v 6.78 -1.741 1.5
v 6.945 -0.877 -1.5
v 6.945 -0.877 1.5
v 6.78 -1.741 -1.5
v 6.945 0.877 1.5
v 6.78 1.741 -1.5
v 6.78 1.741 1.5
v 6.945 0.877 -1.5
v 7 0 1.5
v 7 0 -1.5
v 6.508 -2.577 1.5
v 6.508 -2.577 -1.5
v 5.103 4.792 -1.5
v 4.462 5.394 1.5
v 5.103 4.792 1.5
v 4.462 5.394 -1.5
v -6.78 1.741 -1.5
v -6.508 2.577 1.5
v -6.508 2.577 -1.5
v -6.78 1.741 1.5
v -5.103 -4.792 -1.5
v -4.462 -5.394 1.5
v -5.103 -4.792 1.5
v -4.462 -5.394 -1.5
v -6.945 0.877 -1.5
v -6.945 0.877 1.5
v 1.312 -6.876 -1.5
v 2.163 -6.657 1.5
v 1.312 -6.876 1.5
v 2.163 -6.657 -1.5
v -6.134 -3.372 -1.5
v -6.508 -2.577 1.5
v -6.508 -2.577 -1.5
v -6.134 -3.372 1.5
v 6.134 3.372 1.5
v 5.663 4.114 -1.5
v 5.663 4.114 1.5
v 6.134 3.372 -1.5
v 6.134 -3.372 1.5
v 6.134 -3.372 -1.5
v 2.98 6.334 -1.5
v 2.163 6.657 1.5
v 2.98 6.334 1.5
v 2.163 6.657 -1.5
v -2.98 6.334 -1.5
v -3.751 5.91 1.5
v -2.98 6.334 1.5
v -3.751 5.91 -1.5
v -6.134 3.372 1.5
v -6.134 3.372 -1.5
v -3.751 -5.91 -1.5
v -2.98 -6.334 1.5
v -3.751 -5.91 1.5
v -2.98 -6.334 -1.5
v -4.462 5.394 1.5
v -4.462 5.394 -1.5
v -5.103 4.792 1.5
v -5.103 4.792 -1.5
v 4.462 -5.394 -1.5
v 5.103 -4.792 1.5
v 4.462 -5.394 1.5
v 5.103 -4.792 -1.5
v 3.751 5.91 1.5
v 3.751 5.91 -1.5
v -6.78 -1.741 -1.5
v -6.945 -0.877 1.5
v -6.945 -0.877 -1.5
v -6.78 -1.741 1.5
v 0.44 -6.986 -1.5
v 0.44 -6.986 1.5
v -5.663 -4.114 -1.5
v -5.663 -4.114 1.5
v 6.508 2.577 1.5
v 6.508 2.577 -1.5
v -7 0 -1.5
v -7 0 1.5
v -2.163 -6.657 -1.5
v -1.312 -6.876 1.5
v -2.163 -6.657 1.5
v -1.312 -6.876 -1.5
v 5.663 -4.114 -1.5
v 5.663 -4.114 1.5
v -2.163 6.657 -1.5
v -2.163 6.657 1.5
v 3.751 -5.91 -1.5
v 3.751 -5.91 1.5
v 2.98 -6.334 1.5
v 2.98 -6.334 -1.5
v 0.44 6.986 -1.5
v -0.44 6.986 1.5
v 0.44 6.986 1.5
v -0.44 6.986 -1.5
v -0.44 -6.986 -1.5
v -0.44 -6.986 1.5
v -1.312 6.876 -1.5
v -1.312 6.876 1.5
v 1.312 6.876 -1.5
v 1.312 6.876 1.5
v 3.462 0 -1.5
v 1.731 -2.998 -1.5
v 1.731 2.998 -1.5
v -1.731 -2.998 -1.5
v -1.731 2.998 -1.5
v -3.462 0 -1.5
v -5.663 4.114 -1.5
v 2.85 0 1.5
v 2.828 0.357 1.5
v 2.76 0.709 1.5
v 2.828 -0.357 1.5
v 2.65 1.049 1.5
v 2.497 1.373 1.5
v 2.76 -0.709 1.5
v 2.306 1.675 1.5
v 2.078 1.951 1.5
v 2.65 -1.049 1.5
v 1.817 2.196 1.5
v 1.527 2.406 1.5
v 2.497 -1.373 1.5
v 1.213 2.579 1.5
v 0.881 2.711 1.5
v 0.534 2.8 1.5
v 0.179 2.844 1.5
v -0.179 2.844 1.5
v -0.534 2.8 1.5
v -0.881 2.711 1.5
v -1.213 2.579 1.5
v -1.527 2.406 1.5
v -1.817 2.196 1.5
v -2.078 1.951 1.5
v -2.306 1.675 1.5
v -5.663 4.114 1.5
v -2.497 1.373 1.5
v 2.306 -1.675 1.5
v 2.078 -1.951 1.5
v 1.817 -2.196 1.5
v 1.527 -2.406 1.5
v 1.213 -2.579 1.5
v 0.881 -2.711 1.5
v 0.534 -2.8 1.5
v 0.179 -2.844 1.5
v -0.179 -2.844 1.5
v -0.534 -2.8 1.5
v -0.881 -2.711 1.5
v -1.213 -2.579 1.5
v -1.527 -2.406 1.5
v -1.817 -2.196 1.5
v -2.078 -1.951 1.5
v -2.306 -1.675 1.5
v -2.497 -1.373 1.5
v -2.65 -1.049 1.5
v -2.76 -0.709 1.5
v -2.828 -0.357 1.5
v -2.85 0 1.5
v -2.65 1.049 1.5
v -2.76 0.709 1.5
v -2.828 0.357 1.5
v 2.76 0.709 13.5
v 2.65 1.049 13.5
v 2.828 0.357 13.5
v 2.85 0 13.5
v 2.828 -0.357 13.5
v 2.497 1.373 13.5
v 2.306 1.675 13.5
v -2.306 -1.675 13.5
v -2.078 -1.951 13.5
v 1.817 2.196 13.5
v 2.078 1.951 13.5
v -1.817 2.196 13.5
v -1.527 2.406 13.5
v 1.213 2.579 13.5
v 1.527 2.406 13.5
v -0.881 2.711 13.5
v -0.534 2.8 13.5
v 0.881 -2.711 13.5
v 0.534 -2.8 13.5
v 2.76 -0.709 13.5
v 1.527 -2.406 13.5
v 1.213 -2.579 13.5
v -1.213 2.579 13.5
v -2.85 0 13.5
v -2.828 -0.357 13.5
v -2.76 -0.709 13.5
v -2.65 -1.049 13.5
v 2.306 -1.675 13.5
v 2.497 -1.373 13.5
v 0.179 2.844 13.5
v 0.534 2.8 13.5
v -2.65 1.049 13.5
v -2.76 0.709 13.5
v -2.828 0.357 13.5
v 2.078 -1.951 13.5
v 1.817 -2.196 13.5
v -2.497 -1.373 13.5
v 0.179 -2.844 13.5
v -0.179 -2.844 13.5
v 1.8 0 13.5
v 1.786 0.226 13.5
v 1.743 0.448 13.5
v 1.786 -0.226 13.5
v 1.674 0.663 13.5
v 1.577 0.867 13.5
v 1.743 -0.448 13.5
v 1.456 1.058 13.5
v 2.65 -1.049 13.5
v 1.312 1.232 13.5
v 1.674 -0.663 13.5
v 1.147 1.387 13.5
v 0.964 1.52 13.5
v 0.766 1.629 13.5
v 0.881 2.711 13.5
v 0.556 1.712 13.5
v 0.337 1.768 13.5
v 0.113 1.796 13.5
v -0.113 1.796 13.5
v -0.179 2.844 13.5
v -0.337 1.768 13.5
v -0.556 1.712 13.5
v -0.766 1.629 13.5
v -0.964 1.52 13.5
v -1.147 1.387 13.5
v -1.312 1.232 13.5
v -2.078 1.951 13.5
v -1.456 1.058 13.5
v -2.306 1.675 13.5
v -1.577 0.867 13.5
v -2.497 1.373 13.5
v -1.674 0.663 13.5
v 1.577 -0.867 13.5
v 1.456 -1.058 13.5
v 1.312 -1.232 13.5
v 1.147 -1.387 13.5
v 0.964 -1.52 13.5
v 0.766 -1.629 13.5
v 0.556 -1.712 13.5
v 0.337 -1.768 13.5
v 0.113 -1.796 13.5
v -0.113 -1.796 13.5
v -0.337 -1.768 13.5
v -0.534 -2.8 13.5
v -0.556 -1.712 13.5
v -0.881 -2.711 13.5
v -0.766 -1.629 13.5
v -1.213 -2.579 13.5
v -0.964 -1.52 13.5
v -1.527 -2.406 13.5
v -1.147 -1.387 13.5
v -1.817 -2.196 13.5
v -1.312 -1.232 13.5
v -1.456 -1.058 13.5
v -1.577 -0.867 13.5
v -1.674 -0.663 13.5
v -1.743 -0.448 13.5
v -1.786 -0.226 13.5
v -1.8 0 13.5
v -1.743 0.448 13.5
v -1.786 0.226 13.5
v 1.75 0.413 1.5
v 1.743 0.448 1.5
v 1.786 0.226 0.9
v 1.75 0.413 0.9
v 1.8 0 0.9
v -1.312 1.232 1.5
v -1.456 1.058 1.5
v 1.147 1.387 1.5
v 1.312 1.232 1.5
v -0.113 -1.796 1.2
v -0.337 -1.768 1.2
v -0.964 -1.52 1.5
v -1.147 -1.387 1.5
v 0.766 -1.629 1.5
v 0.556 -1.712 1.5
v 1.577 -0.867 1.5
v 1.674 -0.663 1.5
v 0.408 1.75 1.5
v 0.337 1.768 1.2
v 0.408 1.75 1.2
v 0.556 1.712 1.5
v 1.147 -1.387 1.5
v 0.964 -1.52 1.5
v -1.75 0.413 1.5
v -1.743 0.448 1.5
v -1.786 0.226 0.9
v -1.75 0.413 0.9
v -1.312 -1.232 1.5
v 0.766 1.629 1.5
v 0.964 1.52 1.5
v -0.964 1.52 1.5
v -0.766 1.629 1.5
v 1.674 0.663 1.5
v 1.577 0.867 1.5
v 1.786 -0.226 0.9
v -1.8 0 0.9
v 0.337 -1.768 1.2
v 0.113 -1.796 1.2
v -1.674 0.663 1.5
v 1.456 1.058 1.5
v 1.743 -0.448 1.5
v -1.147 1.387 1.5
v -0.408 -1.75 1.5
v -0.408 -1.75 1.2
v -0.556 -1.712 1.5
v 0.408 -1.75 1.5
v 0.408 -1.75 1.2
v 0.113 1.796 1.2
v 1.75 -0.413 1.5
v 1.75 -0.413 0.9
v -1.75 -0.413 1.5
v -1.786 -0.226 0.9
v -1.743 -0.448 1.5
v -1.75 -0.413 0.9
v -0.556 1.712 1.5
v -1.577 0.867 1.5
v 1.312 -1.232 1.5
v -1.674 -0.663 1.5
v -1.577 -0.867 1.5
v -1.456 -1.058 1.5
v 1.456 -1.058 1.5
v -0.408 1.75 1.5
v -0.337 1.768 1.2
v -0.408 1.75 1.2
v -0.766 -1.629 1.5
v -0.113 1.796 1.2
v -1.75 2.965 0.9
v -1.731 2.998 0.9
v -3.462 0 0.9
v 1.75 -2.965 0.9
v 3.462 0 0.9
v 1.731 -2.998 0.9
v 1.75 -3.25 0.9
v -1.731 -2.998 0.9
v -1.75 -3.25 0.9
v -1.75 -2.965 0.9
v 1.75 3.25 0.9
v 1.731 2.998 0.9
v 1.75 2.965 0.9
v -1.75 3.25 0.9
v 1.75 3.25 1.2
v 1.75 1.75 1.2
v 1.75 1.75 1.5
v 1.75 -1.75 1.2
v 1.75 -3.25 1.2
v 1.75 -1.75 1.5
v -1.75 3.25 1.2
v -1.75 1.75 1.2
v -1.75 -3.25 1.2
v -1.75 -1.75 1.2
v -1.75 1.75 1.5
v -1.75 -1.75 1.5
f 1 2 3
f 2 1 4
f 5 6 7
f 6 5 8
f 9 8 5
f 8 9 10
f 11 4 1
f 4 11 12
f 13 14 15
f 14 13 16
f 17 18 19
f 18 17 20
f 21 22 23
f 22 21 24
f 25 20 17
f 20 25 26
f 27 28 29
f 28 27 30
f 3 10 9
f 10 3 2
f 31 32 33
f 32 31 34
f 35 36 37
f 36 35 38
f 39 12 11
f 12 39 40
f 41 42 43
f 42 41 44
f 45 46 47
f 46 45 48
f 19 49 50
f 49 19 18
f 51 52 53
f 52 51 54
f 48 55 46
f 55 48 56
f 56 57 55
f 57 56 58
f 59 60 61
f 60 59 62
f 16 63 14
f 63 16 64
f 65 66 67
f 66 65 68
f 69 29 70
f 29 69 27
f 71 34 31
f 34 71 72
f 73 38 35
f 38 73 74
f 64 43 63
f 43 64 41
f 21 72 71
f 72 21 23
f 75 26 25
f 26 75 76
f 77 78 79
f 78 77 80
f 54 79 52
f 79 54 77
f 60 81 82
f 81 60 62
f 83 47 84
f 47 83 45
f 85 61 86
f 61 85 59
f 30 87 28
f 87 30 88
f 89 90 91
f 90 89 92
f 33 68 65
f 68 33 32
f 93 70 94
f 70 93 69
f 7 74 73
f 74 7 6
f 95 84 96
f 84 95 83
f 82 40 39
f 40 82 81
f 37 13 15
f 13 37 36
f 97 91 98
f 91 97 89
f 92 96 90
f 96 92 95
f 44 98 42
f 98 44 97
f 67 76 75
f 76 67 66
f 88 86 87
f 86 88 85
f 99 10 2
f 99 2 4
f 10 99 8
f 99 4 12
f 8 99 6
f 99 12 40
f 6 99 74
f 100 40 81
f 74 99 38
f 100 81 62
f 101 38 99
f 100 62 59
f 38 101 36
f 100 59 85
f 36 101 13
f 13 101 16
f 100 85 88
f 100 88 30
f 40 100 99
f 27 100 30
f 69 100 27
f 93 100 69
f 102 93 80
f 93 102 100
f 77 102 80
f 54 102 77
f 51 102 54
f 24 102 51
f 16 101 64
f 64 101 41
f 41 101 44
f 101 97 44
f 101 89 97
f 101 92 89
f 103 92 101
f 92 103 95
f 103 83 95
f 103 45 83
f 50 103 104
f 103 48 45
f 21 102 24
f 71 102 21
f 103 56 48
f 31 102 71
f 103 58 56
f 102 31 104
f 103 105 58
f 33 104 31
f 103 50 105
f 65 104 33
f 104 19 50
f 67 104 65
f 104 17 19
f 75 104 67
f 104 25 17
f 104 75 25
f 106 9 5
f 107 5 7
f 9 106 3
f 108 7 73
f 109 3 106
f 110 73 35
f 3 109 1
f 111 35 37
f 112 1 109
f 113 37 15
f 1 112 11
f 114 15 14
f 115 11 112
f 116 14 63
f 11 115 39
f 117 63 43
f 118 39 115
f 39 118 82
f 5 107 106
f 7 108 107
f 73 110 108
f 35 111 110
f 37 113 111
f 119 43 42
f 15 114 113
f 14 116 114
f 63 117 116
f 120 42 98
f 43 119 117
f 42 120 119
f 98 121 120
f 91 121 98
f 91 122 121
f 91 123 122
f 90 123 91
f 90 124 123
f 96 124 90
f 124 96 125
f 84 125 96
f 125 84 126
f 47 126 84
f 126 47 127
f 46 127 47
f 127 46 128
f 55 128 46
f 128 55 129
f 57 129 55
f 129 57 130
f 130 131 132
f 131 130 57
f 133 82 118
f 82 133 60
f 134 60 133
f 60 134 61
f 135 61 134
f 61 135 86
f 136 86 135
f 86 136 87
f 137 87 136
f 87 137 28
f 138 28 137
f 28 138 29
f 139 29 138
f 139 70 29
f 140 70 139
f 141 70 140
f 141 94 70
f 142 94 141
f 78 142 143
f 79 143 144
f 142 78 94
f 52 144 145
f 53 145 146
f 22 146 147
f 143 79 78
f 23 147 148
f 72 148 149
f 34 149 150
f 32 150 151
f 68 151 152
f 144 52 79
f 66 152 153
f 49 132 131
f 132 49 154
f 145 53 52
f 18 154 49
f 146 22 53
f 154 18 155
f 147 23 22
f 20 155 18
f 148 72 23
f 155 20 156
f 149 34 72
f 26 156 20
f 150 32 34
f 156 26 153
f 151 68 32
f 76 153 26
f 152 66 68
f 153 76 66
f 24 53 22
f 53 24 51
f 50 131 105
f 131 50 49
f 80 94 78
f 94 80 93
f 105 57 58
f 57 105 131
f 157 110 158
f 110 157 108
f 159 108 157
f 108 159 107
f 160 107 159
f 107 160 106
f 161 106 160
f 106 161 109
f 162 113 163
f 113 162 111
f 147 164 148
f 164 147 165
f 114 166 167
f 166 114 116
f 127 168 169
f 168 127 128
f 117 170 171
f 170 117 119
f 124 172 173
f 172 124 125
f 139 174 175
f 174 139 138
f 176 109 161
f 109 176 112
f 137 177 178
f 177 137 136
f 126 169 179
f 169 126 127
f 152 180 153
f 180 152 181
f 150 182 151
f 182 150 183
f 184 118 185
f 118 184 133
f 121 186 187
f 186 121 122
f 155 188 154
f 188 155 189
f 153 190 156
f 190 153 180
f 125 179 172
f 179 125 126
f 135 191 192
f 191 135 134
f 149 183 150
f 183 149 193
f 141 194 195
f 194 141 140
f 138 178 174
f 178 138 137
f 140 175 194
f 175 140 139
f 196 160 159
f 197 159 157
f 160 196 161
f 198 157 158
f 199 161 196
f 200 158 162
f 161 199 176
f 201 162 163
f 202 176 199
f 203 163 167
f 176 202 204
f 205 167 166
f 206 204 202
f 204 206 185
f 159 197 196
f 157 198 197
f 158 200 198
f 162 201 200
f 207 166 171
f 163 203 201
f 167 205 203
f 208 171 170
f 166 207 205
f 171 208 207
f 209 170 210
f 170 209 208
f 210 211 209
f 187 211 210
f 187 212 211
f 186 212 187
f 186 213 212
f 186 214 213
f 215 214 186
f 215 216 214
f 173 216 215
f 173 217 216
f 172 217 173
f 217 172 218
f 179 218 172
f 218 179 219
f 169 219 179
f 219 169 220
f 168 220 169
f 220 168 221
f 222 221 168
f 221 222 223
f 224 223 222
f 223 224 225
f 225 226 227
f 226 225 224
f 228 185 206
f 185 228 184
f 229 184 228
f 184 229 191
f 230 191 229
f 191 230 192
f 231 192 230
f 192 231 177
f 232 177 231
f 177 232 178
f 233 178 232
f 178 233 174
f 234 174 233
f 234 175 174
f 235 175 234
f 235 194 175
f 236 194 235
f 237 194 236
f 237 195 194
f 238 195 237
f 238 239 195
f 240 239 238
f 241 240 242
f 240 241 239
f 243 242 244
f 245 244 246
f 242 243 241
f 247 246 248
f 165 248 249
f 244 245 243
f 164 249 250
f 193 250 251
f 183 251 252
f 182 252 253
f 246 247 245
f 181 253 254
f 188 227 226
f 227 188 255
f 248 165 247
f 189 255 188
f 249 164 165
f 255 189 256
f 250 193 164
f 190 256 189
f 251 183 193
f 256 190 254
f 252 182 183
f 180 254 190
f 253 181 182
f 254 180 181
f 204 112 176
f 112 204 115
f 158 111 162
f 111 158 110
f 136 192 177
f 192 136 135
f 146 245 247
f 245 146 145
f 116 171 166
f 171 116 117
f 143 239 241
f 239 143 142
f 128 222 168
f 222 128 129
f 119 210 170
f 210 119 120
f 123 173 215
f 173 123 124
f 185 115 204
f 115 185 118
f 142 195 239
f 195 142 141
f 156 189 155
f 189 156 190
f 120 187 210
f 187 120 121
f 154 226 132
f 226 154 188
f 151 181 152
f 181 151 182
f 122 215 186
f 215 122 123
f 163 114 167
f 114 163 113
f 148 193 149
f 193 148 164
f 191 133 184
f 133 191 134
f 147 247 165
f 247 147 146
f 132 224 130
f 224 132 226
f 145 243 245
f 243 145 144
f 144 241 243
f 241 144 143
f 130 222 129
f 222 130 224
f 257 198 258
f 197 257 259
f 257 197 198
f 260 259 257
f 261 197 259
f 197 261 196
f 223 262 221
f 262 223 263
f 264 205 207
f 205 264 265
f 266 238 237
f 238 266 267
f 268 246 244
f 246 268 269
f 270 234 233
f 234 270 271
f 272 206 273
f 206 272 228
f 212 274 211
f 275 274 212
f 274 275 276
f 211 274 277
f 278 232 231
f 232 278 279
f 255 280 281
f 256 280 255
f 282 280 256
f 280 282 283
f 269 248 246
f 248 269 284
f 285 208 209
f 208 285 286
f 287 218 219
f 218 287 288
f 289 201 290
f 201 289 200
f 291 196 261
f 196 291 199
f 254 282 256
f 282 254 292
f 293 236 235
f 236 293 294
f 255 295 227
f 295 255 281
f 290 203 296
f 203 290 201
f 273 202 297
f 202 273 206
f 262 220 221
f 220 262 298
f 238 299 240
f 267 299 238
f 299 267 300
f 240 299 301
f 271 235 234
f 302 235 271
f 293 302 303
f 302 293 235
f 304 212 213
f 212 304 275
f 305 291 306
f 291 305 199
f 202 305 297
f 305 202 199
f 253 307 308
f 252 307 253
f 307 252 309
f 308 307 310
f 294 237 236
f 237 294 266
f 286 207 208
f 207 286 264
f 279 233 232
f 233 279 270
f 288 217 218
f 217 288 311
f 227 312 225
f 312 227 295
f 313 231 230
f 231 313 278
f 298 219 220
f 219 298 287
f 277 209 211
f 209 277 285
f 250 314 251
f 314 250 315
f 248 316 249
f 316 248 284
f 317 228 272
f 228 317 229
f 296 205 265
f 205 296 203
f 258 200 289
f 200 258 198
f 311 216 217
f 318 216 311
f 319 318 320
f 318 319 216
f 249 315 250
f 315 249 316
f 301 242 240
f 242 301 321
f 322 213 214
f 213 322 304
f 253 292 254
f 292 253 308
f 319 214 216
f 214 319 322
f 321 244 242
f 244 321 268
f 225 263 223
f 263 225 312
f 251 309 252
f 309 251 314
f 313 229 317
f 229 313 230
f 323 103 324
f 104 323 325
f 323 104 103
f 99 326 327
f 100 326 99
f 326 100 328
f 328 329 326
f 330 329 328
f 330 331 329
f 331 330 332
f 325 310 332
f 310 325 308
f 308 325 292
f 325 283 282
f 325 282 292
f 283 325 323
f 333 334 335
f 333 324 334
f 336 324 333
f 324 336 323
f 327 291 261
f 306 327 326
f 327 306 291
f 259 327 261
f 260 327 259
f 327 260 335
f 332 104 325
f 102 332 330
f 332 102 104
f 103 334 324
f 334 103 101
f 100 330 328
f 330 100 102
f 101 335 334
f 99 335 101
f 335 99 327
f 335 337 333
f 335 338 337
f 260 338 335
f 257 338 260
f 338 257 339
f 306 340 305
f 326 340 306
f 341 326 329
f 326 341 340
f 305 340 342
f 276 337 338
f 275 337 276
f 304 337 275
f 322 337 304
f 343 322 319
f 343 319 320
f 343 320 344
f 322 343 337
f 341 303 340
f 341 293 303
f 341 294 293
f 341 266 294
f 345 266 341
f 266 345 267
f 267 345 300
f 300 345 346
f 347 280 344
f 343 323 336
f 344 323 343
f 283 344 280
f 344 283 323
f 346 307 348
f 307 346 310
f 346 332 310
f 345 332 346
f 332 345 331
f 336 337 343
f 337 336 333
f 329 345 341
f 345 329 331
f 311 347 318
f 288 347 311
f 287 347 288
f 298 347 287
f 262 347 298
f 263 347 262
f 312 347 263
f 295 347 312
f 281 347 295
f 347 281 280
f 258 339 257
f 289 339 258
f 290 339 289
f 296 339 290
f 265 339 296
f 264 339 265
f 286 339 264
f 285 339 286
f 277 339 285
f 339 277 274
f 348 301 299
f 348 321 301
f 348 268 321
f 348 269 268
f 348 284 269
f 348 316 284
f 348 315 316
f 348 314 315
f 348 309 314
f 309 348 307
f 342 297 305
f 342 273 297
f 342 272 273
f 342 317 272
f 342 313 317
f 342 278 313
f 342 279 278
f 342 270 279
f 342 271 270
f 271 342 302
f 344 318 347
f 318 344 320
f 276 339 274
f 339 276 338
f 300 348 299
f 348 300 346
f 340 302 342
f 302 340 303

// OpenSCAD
$fn = 50;


difference() {
	union() {
		translate(v = [0, 0, -1.5000000000]) {
			rotate(a = [0, 0, 0]) {
				cylinder(h = 3, r = 7.0000000000);
			}
		}
		translate(v = [0, 0, -1.5000000000]) {
			rotate(a = [0, 0, 0]) {
				cylinder(h = 15, r = 2.8500000000);
			}
		}
	}
	union() {
		translate(v = [0, 0, -125.0000000000]) {
			rotate(a = [0, 0, 0]) {
				cylinder(h = 250, r = 1.8000000000);
			}
		}
		translate(v = [0, 0, -2.1000000000]) {
			rotate(a = [0, 0, 0]) {
				#translate(v = [0, 0, 0]) {
					rotate(a = [0, 0, 0]) {
						linear_extrude(height = 3) {
							polygon(points = [[3.4620000000, 0.0000000000], [1.7310000000, 2.9981799479], [-1.7310000000, 2.9981799479], [-3.4620000000, 0.0000000000], [-1.7310000000, -2.9981799479], [1.7310000000, -2.9981799479]]);
						}
					}
				}
			}
		}
		#translate(v = [-1.7500000000, -3.2500000000, 0.9000000000]) {
			rotate(a = [0, 0, 0]) {
				cube(size = [3.5000000000, 6.5000000000, 0.3000000000]);
			}
		}
		#translate(v = [-1.7500000000, -1.7500000000, 1.2000000000]) {
			rotate(a = [0, 0, 0]) {
				cube(size = [3.5000000000, 3.5000000000, 0.3000000000]);
			}
		}
		#translate(v = [-1.7500000000, -3.2500000000, -2.4000000000]) {
			rotate(a = [0, 0, 0]) {
				cube(size = [3.5000000000, 6.5000000000, 0.3000000000]);
			}
		}
		#translate(v = [-1.7500000000, -1.7500000000, -2.7000000000]) {
			rotate(a = [0, 0, 0]) {
				cube(size = [3.5000000000, 3.5000000000, 0.3000000000]);
			}
		}
	}
}
